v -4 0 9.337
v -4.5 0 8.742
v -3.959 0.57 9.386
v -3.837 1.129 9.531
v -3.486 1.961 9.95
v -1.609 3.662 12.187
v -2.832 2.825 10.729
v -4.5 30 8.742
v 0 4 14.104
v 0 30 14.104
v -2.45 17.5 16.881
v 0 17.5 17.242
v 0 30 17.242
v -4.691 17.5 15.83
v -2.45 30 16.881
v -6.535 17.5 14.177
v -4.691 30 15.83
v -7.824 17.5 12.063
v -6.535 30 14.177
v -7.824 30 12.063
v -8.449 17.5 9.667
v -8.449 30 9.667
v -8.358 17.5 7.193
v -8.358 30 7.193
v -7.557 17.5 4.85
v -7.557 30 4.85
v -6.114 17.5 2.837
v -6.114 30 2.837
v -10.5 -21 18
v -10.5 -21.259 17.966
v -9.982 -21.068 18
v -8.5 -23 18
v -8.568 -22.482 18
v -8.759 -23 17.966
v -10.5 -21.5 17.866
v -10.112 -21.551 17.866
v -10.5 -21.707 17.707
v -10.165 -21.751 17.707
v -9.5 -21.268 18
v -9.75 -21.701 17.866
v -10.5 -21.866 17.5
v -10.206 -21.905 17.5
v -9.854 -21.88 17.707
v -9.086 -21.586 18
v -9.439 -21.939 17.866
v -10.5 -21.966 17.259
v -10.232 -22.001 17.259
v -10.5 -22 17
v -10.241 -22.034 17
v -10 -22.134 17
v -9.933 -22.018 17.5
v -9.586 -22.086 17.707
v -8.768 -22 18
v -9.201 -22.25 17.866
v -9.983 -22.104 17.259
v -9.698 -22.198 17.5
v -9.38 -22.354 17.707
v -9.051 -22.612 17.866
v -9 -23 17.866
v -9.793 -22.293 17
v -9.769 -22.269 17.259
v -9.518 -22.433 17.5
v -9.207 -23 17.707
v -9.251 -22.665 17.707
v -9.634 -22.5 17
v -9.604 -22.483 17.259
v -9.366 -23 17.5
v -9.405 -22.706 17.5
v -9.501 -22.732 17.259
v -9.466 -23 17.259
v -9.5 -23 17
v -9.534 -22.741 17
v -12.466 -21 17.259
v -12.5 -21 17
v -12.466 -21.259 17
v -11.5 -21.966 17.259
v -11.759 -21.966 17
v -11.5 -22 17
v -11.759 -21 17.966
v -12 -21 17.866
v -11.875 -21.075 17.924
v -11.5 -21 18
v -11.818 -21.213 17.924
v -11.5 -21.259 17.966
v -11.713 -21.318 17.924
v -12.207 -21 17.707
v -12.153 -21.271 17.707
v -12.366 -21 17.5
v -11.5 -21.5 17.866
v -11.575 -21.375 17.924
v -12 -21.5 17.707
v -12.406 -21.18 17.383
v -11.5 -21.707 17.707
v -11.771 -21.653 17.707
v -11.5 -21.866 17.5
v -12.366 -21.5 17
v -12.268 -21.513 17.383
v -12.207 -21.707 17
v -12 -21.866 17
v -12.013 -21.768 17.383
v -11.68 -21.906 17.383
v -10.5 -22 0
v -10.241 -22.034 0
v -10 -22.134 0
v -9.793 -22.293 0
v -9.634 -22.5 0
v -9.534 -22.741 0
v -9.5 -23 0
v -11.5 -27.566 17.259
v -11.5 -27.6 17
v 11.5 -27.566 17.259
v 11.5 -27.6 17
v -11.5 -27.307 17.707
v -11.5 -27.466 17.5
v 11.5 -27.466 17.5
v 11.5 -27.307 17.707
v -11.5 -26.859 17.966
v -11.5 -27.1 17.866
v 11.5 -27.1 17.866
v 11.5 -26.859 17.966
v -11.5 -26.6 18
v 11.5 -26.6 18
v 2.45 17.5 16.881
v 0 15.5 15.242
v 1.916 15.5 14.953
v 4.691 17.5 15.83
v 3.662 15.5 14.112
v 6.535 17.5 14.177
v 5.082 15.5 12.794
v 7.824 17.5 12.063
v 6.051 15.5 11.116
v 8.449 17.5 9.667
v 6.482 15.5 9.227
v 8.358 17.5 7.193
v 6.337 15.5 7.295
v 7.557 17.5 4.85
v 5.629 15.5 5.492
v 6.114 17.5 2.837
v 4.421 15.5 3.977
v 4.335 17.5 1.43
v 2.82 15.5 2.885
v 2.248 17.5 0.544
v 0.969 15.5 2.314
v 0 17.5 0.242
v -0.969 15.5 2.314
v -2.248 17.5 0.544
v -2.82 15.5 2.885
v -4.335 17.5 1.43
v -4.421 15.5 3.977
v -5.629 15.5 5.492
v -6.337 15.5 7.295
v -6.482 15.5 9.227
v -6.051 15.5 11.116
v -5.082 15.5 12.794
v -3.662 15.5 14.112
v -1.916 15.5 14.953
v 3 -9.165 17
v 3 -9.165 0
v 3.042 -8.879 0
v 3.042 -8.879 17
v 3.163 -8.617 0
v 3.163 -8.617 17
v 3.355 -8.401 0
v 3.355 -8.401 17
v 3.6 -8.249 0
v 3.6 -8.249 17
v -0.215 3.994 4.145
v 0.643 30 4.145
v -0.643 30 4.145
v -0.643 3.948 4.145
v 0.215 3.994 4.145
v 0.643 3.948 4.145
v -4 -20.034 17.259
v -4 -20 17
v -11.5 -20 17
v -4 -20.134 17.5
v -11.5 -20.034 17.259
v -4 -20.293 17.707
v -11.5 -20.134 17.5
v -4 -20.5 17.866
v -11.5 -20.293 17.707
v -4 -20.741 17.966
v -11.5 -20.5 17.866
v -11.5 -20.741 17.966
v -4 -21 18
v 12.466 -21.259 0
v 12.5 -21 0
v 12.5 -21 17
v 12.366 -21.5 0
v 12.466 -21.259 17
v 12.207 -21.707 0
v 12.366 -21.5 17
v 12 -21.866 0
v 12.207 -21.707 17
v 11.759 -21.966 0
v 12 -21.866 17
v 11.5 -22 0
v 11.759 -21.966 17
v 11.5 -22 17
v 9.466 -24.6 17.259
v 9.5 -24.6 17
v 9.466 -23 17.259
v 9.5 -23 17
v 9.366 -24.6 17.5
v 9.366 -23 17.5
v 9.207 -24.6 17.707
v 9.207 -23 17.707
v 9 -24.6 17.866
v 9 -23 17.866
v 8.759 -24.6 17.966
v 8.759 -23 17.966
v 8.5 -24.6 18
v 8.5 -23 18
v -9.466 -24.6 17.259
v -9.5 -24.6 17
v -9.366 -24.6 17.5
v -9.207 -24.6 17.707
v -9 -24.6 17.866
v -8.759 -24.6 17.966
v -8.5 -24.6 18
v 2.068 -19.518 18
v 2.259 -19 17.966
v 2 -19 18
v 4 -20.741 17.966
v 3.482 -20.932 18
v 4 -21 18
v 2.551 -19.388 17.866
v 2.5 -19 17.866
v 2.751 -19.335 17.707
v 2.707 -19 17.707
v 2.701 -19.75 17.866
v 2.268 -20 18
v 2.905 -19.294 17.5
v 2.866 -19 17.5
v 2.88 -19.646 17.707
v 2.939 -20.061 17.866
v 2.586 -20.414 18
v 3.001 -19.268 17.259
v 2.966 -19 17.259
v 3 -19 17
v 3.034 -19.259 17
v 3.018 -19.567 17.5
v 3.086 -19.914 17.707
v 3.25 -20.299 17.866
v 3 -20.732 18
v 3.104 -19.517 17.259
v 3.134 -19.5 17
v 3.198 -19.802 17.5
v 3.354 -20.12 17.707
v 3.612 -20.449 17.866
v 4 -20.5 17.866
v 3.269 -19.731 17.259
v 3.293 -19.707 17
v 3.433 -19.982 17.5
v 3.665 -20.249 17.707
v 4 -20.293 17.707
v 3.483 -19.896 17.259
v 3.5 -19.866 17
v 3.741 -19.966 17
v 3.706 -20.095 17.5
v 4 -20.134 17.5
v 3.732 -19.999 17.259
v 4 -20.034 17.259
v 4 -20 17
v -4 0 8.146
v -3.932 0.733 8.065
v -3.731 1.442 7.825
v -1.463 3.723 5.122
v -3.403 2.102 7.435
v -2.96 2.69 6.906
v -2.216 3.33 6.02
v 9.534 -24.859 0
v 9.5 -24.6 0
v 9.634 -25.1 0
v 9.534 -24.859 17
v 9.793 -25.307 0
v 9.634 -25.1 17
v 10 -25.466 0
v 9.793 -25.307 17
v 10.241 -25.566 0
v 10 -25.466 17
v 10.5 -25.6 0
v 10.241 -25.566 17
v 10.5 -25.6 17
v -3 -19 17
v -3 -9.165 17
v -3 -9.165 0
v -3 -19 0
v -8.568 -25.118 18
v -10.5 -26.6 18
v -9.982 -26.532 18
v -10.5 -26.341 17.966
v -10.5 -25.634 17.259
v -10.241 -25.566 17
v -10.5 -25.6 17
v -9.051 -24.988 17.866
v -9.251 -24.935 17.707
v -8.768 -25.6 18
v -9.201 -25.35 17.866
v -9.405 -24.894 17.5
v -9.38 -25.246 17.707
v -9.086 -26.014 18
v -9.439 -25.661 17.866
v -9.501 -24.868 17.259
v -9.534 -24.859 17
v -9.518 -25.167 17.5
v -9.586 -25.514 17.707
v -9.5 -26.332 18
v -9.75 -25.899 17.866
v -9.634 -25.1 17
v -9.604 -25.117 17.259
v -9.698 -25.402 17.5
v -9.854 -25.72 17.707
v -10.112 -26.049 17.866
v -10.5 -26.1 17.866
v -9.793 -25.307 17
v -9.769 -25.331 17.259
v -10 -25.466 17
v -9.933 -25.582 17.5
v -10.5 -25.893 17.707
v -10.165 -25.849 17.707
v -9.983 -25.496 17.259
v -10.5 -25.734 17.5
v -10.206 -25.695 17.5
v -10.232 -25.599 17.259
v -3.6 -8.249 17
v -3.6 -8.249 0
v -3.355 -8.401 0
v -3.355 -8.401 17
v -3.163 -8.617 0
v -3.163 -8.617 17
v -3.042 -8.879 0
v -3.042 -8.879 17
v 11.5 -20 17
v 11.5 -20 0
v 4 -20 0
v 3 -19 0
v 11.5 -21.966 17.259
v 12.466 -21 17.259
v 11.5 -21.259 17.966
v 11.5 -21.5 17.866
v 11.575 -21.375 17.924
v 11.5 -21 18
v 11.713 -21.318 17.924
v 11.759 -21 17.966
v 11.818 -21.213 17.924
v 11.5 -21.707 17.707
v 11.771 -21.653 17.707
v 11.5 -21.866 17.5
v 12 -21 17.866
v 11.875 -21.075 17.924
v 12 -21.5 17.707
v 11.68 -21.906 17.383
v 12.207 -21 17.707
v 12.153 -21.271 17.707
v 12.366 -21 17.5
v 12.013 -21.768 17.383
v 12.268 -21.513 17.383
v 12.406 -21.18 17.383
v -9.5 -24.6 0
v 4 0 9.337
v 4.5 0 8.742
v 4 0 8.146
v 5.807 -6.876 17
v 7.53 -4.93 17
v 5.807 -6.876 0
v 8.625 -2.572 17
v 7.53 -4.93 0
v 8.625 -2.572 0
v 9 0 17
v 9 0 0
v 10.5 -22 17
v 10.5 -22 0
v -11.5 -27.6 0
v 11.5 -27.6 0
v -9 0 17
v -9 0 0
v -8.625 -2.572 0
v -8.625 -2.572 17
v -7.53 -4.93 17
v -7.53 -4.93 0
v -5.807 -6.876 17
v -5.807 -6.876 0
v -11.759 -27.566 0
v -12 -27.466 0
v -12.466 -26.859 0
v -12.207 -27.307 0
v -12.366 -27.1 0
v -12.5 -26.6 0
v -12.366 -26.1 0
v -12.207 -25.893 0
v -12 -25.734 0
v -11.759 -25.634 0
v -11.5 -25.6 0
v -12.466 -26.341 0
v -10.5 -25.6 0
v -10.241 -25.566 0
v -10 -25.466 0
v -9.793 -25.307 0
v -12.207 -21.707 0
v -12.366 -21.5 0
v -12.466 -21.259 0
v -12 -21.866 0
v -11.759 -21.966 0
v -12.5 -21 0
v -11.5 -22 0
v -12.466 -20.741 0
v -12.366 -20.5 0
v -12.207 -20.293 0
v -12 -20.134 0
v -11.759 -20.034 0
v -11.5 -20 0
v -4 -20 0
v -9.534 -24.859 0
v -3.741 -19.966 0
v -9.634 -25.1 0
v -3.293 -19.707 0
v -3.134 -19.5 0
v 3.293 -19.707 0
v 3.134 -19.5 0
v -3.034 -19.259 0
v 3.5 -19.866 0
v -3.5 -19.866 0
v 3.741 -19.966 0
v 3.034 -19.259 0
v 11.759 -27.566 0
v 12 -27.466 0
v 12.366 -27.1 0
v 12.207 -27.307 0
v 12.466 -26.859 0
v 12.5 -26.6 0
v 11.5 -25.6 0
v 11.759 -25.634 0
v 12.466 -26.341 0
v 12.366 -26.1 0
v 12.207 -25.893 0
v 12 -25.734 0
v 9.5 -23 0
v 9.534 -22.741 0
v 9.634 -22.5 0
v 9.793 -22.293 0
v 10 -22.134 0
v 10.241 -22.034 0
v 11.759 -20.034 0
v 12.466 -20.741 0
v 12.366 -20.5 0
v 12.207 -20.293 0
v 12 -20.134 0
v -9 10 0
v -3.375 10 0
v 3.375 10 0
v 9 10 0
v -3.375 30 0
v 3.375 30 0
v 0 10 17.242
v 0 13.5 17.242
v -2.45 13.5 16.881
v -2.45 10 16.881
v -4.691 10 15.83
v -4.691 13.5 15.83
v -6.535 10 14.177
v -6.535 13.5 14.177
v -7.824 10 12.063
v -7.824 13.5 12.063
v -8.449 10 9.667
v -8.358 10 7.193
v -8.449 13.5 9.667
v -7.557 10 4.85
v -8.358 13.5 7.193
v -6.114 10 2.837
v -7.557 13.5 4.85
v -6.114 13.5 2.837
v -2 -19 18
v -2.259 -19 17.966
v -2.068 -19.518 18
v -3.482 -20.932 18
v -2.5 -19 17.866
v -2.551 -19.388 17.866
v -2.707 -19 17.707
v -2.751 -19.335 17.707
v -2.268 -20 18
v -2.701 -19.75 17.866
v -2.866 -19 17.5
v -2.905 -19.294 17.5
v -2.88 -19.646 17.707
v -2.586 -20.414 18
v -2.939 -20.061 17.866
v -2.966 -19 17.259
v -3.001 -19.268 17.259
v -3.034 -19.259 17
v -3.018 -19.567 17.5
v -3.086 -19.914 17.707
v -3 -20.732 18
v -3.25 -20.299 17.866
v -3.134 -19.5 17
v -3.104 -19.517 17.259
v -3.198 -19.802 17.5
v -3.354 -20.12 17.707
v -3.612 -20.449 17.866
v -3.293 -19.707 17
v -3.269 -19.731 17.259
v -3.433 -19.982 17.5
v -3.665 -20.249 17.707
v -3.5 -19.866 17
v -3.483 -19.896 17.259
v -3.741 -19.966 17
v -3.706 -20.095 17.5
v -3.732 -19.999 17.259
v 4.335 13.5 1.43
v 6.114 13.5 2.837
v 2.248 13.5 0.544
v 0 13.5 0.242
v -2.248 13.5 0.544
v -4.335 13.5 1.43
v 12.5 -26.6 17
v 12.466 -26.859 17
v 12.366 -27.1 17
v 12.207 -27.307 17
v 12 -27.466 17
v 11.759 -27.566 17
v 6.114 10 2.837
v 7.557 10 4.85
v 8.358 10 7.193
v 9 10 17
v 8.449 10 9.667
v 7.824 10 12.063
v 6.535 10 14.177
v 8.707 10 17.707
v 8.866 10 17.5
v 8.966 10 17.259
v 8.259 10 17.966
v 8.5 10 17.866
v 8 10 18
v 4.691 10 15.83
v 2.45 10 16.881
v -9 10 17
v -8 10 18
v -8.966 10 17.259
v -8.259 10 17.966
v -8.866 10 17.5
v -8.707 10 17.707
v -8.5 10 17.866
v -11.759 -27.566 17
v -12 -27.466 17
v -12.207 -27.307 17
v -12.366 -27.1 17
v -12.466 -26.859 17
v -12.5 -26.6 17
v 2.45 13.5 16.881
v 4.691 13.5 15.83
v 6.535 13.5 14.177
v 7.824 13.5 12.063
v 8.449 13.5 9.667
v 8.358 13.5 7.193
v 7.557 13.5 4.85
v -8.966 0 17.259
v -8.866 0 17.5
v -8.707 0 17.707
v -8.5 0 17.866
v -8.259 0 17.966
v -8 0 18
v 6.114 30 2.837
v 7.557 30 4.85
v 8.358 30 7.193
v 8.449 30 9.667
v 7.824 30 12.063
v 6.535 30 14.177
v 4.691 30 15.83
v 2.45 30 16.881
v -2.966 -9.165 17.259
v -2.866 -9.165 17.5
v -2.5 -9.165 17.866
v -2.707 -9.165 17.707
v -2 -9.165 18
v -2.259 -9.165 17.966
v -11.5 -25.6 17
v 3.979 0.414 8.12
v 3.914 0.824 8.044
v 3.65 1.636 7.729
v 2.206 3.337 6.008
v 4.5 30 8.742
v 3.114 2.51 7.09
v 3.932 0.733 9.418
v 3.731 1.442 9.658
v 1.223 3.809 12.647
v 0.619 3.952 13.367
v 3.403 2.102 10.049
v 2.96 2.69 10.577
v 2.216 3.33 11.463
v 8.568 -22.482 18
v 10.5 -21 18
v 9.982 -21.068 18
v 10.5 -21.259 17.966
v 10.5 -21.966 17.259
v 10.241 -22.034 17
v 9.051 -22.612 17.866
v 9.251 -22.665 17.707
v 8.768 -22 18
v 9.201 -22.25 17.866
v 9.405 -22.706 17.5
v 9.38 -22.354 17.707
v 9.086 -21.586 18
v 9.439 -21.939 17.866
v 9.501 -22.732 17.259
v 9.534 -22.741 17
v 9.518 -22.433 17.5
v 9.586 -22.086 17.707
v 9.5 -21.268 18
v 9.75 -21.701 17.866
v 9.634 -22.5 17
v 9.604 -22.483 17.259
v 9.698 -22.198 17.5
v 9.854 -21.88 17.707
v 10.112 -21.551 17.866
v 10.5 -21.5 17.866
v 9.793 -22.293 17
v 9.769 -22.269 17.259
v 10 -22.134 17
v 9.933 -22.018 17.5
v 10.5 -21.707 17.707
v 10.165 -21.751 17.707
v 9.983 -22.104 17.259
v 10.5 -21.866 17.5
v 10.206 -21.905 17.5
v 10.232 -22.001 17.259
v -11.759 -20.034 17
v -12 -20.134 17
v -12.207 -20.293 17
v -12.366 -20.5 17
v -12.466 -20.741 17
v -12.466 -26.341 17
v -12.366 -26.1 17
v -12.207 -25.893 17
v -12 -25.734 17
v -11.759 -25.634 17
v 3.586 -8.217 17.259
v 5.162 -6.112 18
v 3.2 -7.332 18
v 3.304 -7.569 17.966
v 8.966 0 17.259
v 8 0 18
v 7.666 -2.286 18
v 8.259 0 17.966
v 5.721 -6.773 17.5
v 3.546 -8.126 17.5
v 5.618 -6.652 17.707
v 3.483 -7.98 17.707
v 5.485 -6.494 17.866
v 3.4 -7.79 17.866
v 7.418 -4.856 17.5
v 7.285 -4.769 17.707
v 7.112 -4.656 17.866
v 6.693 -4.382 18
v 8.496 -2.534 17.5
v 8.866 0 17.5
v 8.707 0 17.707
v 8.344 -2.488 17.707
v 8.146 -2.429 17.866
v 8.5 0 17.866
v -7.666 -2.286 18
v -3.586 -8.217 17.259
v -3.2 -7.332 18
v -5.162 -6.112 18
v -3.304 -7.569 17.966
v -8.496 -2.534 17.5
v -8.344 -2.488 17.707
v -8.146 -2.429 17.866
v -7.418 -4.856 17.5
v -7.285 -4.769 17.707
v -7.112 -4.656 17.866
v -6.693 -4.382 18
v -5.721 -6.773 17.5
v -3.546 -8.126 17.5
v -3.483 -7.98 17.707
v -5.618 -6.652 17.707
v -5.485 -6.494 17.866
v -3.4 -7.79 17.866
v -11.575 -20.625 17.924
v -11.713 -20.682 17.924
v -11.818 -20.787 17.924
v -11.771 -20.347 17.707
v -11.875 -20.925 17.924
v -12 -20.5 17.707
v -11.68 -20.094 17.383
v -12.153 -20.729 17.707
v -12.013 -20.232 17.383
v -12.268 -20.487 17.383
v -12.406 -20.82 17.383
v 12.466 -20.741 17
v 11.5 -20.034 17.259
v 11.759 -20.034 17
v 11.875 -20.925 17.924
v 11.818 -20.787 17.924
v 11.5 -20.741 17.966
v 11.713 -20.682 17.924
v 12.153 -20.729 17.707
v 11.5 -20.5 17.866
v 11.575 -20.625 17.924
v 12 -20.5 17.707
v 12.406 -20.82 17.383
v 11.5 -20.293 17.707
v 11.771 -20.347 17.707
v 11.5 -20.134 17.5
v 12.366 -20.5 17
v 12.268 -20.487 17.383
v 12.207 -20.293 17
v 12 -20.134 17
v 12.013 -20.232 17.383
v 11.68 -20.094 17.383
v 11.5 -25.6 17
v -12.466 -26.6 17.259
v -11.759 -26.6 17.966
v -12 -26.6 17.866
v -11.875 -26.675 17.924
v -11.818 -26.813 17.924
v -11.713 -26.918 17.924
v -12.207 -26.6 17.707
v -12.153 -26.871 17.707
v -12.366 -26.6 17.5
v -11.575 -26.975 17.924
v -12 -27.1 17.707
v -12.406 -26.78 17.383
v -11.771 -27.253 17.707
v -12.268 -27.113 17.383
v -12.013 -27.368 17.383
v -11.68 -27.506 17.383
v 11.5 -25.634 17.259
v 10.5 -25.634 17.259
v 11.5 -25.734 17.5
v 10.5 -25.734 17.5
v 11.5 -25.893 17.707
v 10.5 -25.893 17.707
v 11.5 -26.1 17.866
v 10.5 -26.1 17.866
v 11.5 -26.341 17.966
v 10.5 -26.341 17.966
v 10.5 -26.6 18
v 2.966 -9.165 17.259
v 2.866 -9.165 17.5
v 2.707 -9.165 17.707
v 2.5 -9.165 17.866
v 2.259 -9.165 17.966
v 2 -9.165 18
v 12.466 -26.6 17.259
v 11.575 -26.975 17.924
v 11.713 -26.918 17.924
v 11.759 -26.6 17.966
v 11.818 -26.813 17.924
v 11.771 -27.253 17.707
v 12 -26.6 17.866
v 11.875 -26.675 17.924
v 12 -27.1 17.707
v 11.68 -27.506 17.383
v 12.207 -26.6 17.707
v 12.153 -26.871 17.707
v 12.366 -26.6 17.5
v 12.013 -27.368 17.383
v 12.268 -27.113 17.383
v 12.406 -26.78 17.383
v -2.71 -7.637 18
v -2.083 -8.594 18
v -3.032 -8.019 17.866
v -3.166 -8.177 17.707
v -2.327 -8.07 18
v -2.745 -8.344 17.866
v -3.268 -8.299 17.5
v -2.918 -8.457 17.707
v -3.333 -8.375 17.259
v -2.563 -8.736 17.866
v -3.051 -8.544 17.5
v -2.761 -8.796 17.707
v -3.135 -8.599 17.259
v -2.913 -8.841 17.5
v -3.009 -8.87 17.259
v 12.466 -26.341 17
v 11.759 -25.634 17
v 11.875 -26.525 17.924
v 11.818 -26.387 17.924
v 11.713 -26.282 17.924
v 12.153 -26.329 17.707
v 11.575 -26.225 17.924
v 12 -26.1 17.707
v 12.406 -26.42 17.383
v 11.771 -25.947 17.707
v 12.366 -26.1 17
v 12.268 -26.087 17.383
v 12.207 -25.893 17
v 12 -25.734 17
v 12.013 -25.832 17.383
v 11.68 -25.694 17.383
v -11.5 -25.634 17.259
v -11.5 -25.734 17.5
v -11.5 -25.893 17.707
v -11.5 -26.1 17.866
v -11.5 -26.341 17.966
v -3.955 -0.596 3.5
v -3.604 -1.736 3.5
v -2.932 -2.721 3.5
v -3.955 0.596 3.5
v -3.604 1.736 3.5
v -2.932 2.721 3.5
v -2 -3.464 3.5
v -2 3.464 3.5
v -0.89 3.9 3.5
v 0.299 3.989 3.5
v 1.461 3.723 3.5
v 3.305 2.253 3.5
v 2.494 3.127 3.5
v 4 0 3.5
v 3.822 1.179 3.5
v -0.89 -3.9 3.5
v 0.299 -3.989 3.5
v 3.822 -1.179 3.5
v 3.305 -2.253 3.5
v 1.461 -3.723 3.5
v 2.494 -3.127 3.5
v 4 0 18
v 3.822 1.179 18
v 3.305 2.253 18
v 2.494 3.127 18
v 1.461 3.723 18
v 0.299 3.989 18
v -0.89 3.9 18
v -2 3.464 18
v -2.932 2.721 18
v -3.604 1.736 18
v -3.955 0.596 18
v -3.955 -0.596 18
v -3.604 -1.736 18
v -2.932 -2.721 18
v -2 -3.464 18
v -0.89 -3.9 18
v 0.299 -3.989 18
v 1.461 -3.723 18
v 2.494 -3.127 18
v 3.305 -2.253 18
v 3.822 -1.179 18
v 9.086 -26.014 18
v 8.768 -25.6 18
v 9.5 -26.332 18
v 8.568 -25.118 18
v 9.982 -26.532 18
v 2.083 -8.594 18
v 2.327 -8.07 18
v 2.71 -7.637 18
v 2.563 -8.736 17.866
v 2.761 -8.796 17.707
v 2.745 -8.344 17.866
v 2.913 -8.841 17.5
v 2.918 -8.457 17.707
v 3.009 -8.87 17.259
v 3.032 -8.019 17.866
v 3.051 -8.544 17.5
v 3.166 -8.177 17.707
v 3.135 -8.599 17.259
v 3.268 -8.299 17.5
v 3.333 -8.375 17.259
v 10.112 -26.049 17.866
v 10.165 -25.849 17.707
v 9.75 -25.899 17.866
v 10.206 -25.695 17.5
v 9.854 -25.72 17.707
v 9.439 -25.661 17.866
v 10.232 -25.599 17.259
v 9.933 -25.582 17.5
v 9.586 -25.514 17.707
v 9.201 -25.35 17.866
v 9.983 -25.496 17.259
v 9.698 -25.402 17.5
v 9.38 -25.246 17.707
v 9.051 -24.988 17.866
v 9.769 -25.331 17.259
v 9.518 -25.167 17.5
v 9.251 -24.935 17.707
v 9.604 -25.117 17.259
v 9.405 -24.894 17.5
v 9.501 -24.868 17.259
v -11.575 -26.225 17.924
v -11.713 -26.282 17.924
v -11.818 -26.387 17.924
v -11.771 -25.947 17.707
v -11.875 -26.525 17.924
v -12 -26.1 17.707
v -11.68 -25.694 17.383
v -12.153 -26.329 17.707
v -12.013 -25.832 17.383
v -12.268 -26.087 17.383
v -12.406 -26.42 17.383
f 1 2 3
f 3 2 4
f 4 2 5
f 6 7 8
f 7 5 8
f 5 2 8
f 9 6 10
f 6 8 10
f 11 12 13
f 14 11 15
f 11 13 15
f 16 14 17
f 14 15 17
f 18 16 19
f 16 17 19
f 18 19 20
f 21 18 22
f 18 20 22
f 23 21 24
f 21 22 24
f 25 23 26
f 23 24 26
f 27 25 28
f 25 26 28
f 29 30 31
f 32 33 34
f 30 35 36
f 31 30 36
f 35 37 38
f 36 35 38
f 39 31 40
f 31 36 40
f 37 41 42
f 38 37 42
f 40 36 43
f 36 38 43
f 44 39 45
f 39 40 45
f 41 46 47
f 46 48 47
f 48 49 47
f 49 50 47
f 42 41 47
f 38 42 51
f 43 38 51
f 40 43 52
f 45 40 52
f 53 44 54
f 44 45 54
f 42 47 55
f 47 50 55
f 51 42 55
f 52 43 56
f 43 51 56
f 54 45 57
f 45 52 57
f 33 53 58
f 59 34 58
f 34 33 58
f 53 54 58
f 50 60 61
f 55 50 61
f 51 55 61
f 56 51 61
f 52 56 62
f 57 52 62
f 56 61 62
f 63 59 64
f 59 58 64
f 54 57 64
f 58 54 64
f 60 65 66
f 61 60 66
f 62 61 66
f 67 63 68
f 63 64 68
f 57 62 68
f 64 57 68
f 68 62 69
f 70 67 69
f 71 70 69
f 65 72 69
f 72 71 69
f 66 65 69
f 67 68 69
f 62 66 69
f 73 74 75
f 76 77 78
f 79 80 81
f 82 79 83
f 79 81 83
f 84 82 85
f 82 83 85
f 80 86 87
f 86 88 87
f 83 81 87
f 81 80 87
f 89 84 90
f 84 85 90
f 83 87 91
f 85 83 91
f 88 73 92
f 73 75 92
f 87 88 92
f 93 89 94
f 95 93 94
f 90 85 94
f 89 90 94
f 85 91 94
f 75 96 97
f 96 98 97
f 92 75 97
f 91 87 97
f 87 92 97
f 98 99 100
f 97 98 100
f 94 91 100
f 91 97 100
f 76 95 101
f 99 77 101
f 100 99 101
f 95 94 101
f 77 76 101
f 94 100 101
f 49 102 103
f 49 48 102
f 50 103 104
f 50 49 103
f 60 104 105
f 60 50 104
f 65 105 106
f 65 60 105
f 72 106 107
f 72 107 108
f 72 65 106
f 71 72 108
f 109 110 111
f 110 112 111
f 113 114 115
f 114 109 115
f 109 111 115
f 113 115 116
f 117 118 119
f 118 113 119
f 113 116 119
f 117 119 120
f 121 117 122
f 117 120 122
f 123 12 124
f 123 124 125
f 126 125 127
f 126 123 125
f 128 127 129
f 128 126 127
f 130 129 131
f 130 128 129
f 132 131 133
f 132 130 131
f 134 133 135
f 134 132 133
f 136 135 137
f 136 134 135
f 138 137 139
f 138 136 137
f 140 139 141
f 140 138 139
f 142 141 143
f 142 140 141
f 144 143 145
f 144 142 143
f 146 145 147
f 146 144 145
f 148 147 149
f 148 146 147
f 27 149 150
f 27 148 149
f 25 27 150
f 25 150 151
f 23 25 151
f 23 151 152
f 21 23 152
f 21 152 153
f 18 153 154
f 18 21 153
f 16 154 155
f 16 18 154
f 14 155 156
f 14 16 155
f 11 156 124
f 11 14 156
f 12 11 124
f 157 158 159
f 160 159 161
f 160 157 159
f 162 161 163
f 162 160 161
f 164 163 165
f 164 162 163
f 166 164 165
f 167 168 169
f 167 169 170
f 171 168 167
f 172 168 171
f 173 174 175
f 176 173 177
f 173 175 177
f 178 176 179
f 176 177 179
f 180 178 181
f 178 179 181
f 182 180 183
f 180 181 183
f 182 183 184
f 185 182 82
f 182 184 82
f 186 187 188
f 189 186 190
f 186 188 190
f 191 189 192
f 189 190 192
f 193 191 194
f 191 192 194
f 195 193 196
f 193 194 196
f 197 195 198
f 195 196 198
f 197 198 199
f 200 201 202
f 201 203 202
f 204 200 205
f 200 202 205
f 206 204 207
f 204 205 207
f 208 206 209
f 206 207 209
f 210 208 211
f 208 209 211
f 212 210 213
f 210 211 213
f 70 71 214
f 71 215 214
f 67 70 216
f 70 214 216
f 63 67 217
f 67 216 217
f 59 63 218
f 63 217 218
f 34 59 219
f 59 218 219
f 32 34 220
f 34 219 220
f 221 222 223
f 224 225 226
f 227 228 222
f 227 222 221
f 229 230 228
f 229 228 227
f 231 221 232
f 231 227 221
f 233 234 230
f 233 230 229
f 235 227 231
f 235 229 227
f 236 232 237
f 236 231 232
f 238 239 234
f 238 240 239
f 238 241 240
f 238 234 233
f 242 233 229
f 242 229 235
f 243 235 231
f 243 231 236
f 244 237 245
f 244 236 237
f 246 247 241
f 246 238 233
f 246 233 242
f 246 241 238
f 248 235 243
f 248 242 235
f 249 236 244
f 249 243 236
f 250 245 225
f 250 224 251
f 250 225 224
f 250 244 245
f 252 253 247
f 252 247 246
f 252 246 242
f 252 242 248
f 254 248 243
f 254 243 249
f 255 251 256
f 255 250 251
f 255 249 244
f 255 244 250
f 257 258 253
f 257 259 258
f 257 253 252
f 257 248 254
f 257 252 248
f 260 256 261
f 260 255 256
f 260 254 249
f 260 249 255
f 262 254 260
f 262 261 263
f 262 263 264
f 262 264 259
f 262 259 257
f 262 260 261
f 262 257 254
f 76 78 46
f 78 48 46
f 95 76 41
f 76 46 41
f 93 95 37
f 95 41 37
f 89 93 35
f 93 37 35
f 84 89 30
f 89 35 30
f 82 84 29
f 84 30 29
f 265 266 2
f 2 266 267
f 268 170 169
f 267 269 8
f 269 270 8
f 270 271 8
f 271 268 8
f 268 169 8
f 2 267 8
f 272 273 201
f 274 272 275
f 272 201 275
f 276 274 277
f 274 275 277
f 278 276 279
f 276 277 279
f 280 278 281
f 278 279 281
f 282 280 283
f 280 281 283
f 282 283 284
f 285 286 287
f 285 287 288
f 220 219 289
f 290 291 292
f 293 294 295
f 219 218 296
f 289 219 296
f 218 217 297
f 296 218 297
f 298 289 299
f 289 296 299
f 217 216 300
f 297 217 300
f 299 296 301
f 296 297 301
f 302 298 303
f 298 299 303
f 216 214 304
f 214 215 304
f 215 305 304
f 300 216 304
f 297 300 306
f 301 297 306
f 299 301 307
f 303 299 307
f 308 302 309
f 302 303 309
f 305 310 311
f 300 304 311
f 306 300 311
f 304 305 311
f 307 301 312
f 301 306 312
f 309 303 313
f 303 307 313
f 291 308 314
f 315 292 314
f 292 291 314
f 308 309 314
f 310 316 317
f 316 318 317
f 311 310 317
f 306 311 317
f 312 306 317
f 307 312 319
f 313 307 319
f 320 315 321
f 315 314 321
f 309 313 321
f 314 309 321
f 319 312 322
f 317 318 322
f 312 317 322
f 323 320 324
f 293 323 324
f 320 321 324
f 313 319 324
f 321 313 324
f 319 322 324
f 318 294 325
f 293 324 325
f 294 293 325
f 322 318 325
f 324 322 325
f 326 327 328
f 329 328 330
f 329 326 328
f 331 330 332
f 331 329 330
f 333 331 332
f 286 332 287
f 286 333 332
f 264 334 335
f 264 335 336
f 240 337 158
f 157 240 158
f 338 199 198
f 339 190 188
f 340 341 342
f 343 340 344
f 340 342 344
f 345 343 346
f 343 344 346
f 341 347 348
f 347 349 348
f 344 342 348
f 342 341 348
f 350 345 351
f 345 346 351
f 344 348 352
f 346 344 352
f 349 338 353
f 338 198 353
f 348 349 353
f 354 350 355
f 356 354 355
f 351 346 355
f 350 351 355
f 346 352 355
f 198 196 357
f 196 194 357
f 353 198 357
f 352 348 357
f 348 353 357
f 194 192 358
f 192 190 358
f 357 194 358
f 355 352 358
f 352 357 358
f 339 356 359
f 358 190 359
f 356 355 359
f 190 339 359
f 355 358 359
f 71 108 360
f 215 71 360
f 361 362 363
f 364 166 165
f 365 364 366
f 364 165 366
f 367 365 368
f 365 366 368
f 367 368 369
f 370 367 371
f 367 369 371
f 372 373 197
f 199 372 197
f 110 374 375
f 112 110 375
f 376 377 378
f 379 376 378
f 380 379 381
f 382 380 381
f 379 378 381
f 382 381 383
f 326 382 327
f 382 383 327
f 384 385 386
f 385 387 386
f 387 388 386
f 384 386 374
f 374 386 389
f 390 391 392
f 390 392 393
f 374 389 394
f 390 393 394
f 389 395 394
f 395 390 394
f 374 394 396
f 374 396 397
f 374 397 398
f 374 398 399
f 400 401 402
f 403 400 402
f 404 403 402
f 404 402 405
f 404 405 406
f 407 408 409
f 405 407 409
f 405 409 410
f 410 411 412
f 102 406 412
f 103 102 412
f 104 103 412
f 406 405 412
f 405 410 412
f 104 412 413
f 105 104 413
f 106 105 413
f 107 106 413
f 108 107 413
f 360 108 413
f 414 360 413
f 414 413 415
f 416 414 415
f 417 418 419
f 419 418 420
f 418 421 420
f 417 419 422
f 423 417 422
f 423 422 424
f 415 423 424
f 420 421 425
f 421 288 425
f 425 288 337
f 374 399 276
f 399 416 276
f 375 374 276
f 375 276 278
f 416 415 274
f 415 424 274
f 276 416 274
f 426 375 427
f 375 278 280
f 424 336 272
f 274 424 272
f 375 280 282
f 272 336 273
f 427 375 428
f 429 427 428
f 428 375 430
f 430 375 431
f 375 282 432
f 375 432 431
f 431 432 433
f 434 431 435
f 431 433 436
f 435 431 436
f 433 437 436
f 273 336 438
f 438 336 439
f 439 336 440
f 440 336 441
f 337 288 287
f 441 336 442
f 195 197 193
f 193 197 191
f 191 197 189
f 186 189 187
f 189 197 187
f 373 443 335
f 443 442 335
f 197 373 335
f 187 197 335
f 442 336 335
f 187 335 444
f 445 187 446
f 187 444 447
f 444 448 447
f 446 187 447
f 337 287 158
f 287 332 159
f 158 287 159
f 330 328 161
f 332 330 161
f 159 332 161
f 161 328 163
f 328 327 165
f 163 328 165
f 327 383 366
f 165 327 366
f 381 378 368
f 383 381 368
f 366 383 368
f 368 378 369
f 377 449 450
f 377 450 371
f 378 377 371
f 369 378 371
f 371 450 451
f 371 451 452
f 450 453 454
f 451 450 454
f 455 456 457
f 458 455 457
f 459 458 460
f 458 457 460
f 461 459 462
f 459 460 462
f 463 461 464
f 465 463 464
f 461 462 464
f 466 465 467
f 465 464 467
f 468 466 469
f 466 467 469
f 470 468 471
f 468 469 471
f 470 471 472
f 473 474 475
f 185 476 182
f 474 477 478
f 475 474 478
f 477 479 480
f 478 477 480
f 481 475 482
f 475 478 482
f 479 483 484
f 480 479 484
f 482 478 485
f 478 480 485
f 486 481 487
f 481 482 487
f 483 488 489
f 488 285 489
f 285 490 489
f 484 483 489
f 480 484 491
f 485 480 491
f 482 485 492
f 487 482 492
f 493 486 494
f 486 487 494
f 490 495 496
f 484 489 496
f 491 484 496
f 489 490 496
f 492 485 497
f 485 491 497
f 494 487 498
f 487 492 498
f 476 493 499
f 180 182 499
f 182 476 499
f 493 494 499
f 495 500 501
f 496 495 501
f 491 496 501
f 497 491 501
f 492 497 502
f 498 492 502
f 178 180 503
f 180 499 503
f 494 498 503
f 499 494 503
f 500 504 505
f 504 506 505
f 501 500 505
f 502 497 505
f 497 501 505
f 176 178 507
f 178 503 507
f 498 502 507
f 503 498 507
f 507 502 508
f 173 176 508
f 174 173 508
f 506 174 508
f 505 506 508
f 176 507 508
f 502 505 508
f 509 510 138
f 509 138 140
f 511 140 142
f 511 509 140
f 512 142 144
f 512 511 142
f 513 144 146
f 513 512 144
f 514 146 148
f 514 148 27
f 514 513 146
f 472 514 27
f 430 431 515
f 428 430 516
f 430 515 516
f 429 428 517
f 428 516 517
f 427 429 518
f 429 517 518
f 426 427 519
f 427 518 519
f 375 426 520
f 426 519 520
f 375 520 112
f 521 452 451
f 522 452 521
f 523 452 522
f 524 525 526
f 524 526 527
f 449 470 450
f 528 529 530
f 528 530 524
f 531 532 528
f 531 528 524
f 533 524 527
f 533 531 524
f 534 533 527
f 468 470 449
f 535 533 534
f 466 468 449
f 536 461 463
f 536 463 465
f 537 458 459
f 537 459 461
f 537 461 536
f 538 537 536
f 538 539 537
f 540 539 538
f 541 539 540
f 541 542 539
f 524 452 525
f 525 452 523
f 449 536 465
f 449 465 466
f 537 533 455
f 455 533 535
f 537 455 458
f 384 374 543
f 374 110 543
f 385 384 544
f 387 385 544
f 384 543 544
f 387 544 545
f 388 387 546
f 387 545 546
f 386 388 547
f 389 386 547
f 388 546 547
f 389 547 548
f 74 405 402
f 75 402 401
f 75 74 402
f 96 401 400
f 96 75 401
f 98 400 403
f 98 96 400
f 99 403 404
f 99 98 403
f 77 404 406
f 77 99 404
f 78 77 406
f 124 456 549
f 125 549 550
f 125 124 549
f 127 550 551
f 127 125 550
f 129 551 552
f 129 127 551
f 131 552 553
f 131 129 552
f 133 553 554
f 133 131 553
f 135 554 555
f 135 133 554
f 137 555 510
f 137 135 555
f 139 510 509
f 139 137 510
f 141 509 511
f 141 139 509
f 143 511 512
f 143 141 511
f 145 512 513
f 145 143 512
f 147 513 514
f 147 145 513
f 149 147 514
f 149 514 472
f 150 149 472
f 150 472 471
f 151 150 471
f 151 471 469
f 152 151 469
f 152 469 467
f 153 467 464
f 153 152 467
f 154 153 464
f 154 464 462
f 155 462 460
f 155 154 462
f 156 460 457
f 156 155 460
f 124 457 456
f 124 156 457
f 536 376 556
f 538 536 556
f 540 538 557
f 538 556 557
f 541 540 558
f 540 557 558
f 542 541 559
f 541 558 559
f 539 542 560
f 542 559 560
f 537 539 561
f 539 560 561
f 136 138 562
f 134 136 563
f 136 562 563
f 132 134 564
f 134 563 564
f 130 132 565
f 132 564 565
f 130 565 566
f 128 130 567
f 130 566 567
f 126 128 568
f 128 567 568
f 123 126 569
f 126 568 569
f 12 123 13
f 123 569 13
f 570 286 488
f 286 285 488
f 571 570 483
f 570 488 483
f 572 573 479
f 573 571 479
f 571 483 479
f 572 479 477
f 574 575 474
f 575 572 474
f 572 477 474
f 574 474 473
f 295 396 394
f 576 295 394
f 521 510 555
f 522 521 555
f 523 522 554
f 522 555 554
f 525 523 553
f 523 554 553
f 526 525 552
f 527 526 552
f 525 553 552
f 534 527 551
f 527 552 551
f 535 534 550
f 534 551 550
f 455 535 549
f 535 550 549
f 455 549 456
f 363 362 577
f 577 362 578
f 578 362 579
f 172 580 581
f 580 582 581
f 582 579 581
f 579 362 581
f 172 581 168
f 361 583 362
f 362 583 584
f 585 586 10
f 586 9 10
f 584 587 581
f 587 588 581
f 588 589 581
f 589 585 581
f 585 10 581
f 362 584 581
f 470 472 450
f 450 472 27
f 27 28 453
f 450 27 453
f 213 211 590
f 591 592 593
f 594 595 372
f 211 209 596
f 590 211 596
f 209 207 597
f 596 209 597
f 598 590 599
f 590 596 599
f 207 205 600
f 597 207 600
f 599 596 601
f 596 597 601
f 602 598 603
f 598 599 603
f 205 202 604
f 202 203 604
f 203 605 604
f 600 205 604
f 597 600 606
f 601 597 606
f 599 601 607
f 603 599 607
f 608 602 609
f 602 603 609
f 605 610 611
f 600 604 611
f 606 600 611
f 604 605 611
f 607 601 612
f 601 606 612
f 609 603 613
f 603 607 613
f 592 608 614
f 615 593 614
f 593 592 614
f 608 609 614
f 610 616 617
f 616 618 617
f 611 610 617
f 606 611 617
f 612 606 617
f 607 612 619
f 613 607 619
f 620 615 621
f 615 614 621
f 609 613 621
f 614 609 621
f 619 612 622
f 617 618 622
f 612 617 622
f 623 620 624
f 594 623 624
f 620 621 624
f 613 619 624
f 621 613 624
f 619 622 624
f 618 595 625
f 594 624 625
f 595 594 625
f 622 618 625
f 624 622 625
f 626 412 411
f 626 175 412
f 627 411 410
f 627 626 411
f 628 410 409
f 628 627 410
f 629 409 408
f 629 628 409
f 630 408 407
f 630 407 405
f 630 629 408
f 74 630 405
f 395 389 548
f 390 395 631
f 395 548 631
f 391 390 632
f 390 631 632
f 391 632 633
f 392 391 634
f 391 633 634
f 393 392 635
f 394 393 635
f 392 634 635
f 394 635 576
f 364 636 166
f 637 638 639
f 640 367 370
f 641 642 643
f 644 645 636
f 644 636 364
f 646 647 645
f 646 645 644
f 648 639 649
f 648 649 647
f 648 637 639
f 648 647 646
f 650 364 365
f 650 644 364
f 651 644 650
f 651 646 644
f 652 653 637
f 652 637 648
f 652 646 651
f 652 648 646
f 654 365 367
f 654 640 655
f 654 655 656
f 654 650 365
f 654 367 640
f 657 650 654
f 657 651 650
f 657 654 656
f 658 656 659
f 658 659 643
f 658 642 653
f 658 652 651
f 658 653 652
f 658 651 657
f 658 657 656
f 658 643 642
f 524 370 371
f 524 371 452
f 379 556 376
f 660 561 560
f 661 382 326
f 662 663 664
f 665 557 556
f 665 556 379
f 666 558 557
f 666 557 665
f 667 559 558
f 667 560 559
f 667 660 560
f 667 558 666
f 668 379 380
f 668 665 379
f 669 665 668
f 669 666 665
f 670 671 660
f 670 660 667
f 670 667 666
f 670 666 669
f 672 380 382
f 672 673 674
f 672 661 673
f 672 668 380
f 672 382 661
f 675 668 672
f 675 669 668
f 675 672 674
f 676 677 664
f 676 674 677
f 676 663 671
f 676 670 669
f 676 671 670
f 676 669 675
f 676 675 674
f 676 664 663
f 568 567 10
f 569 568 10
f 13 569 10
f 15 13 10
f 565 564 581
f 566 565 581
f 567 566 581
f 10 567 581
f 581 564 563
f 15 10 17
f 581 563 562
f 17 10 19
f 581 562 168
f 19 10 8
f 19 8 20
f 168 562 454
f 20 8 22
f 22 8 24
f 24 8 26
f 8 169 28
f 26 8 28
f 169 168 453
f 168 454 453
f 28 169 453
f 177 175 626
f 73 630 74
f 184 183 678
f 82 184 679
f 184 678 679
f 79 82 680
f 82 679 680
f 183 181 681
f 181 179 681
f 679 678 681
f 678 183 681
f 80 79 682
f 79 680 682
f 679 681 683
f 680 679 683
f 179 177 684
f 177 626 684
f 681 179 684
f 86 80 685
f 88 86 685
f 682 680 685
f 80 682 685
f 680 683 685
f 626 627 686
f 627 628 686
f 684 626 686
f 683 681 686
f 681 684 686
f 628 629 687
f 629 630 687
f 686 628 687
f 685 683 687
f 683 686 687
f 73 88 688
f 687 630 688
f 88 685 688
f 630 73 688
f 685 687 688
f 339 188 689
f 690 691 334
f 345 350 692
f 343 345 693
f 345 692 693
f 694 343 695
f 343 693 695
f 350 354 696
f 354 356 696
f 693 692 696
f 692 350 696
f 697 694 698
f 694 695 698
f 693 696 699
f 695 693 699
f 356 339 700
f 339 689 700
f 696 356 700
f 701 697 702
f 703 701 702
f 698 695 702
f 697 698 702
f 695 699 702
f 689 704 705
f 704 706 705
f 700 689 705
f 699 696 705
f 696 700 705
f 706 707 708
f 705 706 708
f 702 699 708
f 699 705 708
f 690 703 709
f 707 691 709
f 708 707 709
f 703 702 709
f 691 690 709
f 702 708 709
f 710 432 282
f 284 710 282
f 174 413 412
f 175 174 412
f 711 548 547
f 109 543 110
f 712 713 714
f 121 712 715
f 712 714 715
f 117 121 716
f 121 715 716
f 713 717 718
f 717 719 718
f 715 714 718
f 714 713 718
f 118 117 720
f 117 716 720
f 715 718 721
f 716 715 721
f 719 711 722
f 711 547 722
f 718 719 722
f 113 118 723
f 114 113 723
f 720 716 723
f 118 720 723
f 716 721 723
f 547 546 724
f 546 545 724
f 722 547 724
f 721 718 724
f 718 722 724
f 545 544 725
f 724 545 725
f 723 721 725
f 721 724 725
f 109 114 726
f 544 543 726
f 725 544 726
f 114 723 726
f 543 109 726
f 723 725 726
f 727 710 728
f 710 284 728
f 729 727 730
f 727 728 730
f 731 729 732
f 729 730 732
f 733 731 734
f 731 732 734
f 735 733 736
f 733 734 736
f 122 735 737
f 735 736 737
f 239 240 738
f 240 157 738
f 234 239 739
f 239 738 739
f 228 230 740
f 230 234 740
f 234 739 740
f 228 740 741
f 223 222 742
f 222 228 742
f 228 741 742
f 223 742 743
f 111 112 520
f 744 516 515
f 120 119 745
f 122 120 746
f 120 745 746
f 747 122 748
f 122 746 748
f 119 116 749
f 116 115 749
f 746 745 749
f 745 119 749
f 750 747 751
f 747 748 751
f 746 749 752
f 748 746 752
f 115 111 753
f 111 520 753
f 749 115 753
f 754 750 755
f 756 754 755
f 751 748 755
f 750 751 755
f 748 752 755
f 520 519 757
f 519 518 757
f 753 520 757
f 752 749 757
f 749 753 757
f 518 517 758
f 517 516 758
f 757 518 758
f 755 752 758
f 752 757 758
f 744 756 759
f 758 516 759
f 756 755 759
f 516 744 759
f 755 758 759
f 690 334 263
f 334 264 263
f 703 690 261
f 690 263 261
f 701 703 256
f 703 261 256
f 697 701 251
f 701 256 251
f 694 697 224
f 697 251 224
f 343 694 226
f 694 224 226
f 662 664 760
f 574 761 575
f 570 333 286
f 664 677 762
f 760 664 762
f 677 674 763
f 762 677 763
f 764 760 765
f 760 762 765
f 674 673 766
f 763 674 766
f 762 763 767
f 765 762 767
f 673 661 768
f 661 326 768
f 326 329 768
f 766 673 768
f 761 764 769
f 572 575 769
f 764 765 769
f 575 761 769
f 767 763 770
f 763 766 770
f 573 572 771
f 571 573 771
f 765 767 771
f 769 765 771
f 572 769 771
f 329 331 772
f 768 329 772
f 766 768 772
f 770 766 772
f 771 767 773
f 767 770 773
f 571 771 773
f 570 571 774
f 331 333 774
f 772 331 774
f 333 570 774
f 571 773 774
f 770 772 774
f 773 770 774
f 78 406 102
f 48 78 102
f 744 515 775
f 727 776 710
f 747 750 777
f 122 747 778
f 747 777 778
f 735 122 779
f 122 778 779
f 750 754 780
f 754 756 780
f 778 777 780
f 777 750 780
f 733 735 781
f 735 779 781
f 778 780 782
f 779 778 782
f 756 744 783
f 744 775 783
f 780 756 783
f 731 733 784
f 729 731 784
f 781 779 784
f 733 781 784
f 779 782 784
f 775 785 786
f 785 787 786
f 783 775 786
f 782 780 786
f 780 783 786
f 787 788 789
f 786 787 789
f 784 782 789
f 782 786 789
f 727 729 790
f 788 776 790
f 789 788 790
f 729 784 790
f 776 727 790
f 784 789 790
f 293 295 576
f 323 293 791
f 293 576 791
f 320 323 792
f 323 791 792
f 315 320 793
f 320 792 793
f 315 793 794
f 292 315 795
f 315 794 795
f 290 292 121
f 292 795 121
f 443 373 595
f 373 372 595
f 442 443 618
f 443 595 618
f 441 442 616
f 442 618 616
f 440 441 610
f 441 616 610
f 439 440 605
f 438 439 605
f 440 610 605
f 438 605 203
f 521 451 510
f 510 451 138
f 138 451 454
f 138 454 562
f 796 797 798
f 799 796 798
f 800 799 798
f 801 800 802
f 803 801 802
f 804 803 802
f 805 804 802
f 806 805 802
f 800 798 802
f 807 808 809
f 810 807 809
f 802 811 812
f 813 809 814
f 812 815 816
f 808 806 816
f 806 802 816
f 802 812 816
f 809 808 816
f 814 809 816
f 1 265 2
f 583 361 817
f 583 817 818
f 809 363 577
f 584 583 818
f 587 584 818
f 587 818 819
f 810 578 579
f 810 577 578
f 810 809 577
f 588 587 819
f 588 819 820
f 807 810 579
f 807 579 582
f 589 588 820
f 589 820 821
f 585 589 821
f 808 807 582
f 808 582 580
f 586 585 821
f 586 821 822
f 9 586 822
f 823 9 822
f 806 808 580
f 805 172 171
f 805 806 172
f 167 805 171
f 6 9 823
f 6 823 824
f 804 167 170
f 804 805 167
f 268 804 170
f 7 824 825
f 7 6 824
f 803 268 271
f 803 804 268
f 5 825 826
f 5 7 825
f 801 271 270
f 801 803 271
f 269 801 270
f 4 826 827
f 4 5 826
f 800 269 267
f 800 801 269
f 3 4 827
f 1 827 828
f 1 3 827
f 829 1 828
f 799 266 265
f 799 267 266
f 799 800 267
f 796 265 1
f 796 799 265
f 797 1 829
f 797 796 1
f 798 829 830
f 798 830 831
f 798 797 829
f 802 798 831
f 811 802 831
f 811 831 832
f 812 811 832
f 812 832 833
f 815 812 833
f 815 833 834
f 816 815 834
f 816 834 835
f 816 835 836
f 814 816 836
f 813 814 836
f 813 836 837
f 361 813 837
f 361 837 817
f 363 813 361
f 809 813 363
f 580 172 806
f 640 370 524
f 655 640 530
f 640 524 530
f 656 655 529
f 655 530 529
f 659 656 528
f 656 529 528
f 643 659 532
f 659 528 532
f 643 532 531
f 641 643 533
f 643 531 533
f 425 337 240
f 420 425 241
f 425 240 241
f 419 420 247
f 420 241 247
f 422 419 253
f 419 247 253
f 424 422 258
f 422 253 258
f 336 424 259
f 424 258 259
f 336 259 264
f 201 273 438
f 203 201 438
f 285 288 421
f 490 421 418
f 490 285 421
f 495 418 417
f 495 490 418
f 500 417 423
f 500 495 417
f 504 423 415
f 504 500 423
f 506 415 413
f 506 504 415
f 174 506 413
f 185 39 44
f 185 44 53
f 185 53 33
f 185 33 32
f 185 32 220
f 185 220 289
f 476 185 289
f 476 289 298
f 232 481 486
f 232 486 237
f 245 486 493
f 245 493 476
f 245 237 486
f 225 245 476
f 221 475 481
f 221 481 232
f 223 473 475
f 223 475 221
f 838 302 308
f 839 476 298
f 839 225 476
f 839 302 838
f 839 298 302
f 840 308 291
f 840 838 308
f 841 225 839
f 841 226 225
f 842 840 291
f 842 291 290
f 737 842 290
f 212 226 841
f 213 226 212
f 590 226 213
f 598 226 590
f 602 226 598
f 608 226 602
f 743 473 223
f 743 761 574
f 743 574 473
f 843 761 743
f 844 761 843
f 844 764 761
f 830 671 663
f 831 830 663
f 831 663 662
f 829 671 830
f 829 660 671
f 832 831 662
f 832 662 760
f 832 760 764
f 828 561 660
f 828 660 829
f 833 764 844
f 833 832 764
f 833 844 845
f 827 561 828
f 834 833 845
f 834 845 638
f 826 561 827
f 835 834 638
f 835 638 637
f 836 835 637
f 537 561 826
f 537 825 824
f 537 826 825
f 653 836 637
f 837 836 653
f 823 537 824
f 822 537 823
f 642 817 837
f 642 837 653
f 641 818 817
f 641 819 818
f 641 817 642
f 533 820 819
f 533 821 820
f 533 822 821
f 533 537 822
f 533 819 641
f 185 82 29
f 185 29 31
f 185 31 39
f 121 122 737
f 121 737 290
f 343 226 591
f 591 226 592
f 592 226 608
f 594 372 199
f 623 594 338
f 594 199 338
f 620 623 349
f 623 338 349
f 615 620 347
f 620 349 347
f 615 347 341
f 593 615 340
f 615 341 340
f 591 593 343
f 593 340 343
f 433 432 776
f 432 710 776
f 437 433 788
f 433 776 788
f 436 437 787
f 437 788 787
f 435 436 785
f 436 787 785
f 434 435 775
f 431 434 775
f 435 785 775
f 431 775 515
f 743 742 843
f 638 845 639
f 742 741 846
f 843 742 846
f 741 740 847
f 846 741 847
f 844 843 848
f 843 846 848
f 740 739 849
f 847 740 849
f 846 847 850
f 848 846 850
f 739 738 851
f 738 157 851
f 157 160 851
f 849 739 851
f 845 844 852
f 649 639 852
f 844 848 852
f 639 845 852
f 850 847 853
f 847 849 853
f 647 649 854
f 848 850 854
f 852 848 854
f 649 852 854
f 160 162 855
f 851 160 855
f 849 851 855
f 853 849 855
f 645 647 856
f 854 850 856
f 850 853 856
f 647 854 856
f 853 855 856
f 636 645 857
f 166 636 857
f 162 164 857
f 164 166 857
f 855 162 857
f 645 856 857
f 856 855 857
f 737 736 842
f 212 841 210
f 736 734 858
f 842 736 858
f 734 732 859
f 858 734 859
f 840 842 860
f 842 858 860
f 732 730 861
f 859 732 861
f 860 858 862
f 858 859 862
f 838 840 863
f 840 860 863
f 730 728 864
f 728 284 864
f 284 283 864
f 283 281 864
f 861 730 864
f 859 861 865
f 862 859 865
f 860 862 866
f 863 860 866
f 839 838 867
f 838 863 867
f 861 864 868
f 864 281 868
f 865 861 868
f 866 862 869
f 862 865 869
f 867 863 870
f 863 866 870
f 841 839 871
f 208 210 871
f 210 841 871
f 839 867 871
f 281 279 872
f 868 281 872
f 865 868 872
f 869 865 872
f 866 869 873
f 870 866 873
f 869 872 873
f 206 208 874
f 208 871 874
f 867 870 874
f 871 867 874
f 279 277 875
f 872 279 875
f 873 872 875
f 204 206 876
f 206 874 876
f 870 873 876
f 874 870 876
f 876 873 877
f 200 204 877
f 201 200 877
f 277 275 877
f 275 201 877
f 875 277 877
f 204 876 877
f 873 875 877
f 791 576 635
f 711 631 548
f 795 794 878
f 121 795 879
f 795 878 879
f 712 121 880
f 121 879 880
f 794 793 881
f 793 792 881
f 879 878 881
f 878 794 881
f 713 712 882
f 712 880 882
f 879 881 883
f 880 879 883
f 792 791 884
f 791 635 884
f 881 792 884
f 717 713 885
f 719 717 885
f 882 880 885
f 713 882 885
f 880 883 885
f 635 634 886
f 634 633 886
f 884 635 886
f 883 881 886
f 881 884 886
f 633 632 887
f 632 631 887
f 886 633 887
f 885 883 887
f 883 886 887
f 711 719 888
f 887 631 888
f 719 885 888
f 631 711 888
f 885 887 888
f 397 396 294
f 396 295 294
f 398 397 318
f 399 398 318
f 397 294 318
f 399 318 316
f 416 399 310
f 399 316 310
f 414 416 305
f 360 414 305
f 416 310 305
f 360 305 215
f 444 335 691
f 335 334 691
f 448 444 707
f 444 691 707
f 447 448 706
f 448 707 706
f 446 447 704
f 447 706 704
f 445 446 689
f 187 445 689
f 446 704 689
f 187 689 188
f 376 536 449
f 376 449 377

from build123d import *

# Parameters (mm, degrees)
F0_R      = 4
F1_DEPTH  = 18
F3_R      = 0.99999
F6_DEPTH  = 20
F8_DEPTH  = 30
F9_SIZE   = 1
F10_R     = 5
F11_DEPTH = 3.5


# Not quite as in the source:
# - two fillets or chamfers of one size are made in one step
# - a fillet or chamfer is up to 0.001 mm smaller than in the source, because OpenCascade refuses the exact size


with BuildPart() as f1:
    # F0 (on Top) → F1 (new body)
    with BuildSketch(Plane.XY):
        with BuildLine():
            Line((3, -20), (3, -8.4852813742))
            ThreePointArc((3, -8.4852813742), (7.3484692283, -5.1961524227), (9, 0))
            Line((9, 0), (9, 30))
            Line((9, 30), (-9, 30))
            Line((-9, 30), (-9, 0))
            ThreePointArc((-9, 0), (-7.3484692283, -5.1961524227), (-3, -8.4852813742))
            Line((-3, -8.4852813742), (-3, -20))
            Line((-3, -20), (-12.5, -20))
            Line((-12.5, -20), (-12.5, -22))
            Line((-12.5, -22), (-9.5, -22))
            Line((-9.5, -22), (-9.5, -25.6))
            Line((-9.5, -25.6), (-12.5, -25.6))
            Line((-12.5, -25.6), (-12.5, -27.6))
            Line((-12.5, -27.6), (0, -27.6))
            Line((0, -27.6), (12.5, -27.6))
            Line((12.5, -27.6), (12.5, -25.6))
            Line((12.5, -25.6), (9.5, -25.6))
            Line((9.5, -25.6), (9.5, -22))
            Line((9.5, -22), (12.5, -22))
            Line((12.5, -22), (12.5, -20))
            Line((12.5, -20), (3, -20))
        make_face()
        Circle(F0_R, mode=Mode.SUBTRACT)
    extrude(amount=F1_DEPTH)

    # F3 (radius 1 in the source; OpenCascade refuses exactly that, so slightly less here)
    f3_edges = [f1.edges().sort_by_distance(p)[0] for p in [
        (3, -20, 9),
        (-3, -20, 9),
        (3, -8.485281, 9),
        (12.5, -27.6, 9),
        (-12.5, -27.6, 9),
        (-9.5, -25.6, 9),
        (-12.5, -25.6, 9),
        (-9.5, -22, 9),
        (-12.5, -22, 9),
        (-12.5, -20, 9),
        (12.5, -25.6, 9),
        (9.5, -25.6, 9),
        (9.5, -22, 9),
        (12.5, -22, 9),
        (12.5, -20, 9),
        (3, -14.242641, 18),
        (7.348469, -5.196152, 18),
        (9, 15, 18),
        (-9, 15, 18),
        (-7.348469, -5.196152, 18),
        (-3, -14.242641, 18),
        (-7.75, -20, 18),
        (-12.5, -21, 18),
        (-11, -22, 18),
        (-9.5, -23.8, 18),
        (-11, -25.6, 18),
        (-12.5, -26.6, 18),
        (0, -27.6, 18),
        (12.5, -26.6, 18),
        (11, -25.6, 18),
        (9.5, -23.8, 18),
        (11, -22, 18),
        (12.5, -21, 18),
        (7.75, -20, 18),
        (-3, -8.485281, 9),
    ]]
    fillet(f3_edges, radius=F3_R)

    # F5 (on face) → F6 (cut)
    with BuildSketch(Plane(origin=(0, 30, 0), x_dir=(-1, 0, 0), z_dir=(0, 1, 0))):
        with BuildLine():
            Line((-11.1393053085, 0), (-9, 0))
            Line((-9, 0), (-9, 17.00001))
            ThreePointArc((-9, 17.00001), (-8.7071097101, 17.7071097101), (-8.00001, 18))
            Line((-8.00001, 18), (8.00001, 18))
            ThreePointArc((8.00001, 18), (8.7071097101, 17.7071097101), (9, 17.00001))
            Line((9, 17.00001), (9, 21.8532588333))
            Line((9, 21.8532588333), (-11.1393053085, 21.8532588333))
            Line((-11.1393053085, 21.8532588333), (-11.1393053085, 0))
        make_face()
        with BuildLine():
            Line((6.1143883029, 2.836985475), (3.3747432753, 0))
            Line((3.3747432753, 0), (9, 0))
            Line((9, 0), (9, 17.00001))
            ThreePointArc((9, 17.00001), (8.7071097101, 17.7071097101), (8.00001, 18))
            Line((8.00001, 18), (-8.00001, 18))
            ThreePointArc((-8.00001, 18), (-8.7071097101, 17.7071097101), (-9, 17.00001))
            Line((-9, 17.00001), (-9, 0))
            Line((-9, 0), (-3.3747432753, 0))
            Line((-3.3747432753, 0), (-6.1143883029, 2.836985475))
            ThreePointArc((-6.1143883029, 2.836985475), (-7.8242912543, 12.0627962161), (0, 17.2415816239))
            ThreePointArc((0, 17.2415816239), (7.8242912543, 12.0627962161), (6.1143883029, 2.836985475))
        make_face()
    extrude(amount=-F6_DEPTH, mode=Mode.SUBTRACT)

    # F7 (on face) → F8 (cut)
    with BuildSketch(Plane(origin=(0, 30, 0), x_dir=(-1, 0, 0), z_dir=(0, 1, 0))):
        Polygon((4.5, 8.7415816239), (0, 14.1044727906), (-4.5, 8.7415816239), (0, 3.3786904573), align=None)
    extrude(amount=-F8_DEPTH, mode=Mode.SUBTRACT)

    # F9
    f9_edges = [f1.edges().sort_by_distance(p)[0] for p in [
        (0, 17, 3.37869),
    ]]
    chamfer(f9_edges, length=F9_SIZE)

    # F10 (on face) → F11 (join)
    with BuildSketch(Plane(origin=(0, 0, 0), x_dir=(1, 0, 0), z_dir=(0, 0, -1))):
        Circle(F10_R)
    extrude(amount=-F11_DEPTH)

    # F12 (on Right) → F13 (revolve, cut)
    with BuildSketch(Plane.YZ):
        Polygon((17.5, 17.2415816239), (13.5, 17.2415816239), (15.5, 15.2415816239), align=None)
    revolve(axis=Axis((0, 30, 8.7415816239), (0, 1, 0)), mode=Mode.SUBTRACT)


solid = f1.part
